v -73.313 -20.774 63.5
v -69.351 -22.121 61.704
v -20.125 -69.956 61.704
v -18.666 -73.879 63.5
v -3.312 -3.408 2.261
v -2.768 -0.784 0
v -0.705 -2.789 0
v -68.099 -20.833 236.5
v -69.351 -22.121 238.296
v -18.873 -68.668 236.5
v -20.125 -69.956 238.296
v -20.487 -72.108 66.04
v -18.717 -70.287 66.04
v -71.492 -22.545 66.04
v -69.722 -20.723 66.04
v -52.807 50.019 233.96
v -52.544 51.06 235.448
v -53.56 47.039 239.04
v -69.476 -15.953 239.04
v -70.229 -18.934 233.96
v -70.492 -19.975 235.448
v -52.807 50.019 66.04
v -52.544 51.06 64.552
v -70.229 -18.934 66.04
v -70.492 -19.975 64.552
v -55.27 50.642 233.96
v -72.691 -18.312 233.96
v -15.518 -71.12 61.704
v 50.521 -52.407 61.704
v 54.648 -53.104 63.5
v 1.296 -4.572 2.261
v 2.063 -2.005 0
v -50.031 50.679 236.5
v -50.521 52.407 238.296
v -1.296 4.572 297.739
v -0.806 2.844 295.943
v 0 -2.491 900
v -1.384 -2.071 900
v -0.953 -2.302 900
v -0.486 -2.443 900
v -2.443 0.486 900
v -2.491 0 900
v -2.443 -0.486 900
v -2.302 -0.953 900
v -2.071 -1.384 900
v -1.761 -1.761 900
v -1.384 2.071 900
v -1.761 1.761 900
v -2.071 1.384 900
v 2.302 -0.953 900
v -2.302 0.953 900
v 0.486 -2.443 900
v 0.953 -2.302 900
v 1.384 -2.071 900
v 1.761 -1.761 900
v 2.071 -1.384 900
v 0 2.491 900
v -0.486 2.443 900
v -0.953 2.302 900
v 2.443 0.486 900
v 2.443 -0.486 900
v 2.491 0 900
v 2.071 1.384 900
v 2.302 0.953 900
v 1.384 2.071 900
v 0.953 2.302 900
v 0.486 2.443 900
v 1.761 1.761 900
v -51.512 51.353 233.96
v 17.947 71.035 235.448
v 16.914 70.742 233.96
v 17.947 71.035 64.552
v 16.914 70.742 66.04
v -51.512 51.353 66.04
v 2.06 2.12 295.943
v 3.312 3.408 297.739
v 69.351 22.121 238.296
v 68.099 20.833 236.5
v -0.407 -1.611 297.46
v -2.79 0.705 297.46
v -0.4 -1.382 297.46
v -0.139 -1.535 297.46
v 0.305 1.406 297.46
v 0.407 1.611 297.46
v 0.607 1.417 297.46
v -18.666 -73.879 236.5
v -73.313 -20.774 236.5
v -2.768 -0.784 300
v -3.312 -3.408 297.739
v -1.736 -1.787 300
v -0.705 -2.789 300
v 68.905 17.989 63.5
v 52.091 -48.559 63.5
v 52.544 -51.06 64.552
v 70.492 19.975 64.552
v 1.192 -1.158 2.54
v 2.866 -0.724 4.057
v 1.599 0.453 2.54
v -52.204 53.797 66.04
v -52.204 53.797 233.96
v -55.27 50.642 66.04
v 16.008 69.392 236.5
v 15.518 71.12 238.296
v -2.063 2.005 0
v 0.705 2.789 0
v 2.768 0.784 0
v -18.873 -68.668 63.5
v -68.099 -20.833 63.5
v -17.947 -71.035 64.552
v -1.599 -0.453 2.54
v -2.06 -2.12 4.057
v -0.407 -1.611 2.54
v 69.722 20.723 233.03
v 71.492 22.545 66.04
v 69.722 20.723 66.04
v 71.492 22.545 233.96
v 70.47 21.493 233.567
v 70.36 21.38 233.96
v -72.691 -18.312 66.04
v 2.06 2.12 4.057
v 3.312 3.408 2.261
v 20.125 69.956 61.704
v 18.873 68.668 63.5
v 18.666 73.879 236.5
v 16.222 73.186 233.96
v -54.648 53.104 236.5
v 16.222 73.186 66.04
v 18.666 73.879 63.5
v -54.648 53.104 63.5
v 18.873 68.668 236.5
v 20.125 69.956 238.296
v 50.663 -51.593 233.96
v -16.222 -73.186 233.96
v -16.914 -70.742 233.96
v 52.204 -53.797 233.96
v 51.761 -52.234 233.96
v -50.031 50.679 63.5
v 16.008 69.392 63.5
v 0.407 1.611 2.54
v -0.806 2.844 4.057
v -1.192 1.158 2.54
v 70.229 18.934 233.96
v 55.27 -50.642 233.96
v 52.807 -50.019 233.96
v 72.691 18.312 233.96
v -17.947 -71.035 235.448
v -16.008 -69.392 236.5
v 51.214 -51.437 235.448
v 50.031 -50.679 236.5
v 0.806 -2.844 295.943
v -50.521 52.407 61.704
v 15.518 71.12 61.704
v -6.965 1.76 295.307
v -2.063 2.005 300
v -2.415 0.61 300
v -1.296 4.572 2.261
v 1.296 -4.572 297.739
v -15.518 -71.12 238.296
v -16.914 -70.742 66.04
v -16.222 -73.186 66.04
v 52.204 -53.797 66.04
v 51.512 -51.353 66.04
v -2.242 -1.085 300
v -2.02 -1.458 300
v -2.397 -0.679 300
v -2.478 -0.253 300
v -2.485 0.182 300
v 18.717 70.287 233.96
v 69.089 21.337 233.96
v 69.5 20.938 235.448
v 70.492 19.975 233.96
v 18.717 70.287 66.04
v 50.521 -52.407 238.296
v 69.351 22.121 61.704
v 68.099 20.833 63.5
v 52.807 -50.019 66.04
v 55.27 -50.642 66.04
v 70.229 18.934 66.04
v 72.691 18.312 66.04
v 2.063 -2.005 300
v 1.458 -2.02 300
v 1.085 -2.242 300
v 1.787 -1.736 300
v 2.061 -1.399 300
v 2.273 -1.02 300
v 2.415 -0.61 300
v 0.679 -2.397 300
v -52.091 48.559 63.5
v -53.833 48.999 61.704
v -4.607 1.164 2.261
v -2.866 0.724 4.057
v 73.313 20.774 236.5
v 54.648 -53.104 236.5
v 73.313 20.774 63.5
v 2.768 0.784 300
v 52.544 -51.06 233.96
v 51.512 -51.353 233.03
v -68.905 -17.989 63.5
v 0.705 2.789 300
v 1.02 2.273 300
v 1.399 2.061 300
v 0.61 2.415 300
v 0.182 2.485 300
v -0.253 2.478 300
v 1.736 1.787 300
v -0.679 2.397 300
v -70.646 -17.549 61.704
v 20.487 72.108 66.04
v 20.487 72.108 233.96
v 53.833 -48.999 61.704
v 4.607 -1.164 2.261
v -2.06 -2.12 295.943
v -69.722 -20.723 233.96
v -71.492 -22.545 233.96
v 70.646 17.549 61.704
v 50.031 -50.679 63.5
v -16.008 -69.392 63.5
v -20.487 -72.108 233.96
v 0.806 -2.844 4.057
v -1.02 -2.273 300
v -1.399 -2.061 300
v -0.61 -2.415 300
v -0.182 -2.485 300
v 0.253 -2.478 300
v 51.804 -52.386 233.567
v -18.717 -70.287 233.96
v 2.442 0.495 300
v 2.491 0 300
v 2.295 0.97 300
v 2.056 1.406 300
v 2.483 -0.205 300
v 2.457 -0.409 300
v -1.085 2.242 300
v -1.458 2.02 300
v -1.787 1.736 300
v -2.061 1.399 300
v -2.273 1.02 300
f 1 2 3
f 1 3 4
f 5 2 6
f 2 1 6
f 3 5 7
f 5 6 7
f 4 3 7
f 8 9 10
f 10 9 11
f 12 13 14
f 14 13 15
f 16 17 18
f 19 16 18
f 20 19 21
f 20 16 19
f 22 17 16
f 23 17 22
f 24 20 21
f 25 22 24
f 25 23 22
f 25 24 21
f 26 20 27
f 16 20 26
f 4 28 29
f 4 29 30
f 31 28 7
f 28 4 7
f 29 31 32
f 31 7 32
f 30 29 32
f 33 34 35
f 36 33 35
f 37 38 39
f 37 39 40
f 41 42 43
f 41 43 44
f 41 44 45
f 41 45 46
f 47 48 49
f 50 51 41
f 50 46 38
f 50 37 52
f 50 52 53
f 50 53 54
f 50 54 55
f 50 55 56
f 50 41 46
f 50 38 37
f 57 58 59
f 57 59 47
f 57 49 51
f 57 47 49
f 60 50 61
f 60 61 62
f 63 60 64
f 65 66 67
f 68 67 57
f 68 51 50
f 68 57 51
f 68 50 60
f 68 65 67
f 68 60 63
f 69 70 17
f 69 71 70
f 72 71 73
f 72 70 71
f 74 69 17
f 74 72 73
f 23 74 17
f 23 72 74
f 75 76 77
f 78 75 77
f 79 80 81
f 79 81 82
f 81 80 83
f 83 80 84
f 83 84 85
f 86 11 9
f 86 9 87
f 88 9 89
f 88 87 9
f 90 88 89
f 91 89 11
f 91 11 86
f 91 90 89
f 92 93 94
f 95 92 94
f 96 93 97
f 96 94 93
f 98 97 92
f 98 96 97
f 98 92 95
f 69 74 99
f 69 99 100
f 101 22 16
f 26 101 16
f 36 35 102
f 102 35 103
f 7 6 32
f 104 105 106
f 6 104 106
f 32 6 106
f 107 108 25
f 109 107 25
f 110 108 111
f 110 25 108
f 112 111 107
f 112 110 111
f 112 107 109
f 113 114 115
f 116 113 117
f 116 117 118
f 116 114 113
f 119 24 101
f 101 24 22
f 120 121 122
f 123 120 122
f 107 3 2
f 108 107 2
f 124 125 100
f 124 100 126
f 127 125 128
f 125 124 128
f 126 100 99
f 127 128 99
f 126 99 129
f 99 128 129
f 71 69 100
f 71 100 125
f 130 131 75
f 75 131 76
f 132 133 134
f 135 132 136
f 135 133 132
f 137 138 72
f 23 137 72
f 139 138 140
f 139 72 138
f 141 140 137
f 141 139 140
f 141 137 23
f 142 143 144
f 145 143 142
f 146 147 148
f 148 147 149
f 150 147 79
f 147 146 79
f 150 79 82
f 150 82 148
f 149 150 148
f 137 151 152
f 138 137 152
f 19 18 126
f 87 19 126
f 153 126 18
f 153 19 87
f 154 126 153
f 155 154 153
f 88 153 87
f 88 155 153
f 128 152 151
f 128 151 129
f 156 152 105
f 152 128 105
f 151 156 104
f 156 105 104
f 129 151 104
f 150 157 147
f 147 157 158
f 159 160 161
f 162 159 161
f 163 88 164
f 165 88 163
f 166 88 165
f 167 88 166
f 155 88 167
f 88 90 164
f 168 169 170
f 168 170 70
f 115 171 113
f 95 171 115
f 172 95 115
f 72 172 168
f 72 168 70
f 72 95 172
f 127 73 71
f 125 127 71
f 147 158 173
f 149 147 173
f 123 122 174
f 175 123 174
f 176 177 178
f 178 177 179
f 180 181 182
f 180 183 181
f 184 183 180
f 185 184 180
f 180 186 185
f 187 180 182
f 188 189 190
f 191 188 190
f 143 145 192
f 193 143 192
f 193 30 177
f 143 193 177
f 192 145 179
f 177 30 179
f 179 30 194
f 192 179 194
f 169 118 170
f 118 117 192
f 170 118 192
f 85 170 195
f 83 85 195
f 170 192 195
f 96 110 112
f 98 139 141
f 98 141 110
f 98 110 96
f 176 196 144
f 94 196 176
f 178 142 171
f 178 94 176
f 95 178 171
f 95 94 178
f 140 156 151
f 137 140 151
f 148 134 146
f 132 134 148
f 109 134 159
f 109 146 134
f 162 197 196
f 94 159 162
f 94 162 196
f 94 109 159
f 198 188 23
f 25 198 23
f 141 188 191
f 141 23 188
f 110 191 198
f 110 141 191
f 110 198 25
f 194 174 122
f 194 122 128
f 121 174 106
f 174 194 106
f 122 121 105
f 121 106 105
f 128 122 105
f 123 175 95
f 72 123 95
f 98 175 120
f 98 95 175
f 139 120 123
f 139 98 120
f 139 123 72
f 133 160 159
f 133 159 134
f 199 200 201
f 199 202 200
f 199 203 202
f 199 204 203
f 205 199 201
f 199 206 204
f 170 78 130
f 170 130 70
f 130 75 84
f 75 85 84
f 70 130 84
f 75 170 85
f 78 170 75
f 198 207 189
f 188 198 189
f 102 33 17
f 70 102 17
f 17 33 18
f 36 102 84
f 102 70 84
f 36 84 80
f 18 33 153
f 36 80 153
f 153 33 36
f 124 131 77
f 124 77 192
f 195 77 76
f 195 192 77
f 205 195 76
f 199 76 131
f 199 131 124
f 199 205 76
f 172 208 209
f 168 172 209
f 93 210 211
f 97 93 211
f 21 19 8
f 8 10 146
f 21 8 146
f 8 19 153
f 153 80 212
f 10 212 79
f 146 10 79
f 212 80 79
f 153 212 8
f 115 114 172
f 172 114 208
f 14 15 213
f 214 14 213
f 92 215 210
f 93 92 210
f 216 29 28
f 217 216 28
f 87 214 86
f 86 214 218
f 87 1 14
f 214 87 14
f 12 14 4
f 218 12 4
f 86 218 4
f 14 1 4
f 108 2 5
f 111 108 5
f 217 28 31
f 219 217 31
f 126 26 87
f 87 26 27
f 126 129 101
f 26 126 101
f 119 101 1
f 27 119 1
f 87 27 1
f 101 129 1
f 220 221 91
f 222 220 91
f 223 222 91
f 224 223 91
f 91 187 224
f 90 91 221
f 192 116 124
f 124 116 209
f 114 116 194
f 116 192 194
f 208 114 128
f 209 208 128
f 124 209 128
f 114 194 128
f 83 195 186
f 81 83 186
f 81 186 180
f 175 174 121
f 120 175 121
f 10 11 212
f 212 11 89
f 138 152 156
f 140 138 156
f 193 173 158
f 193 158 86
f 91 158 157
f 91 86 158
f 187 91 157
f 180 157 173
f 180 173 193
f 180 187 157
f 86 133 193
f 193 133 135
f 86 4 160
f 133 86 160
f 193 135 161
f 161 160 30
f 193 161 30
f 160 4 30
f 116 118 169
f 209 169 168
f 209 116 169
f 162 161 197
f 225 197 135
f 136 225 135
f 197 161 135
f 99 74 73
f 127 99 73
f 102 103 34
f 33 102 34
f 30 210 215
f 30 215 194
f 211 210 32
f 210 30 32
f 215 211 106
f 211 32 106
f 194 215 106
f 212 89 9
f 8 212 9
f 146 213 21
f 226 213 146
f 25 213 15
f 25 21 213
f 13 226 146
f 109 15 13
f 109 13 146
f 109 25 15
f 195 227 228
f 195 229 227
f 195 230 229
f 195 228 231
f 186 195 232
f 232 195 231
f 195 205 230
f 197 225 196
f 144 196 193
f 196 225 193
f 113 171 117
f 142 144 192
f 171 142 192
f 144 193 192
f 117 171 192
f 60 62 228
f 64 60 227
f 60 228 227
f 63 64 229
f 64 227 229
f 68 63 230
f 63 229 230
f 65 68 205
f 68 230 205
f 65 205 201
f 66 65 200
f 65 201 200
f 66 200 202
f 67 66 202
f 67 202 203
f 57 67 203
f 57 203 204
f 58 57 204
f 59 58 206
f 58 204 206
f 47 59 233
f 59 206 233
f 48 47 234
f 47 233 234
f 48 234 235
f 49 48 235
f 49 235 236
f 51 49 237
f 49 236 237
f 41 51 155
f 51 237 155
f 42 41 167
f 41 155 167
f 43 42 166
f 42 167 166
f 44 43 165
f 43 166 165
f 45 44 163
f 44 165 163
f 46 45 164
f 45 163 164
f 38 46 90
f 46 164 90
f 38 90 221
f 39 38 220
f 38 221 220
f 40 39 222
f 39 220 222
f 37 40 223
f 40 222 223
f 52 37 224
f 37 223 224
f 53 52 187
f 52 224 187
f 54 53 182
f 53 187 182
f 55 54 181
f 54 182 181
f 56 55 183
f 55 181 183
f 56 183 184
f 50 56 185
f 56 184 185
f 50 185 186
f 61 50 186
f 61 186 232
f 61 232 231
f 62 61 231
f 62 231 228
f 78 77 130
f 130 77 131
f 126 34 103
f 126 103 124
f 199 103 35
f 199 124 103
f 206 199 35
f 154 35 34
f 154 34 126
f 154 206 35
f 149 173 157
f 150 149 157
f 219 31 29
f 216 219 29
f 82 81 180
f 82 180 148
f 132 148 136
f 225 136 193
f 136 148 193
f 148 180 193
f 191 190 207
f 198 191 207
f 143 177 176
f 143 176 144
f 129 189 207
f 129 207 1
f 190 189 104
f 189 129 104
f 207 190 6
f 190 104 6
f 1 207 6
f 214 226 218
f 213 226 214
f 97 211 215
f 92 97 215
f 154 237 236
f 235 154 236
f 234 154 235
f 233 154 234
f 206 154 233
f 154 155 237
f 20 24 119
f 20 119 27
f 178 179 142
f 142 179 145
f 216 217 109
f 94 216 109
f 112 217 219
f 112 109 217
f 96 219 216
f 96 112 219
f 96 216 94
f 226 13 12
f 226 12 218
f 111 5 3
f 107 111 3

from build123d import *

# Parameters (mm, degrees)
F1_DEPTH  = 300
F2_SIZE   = 63.5
F3_T      = -2.54
F5_DEPTH  = 2.54
F7_DEPTH  = 2.54
F9_DEPTH  = 7.1852048969
F10_DEPTH = 2.541
F12_DEPTH = 2.54
F14_DEPTH = 2.54
F15_W     = 71.12
F15_H     = 167.92
F16_DEPTH = 157.0594794416
F17_W     = 71.12
F17_H     = 167.92
F18_DEPTH = 155.1690173594
F19_W     = 71.12
F19_H     = 167.92
F20_DEPTH = 170.067634702
F22_DEPTH = 2.54
F24_DEPTH = 2.54
F26_DEPTH = 2.54
F28_DEPTH = 2.54
F30_DEPTH = 2.54
F32_DEPTH = 2.54
F33_R     = 2.4911357684
F34_DEPTH = 600


# Not quite as in the source:
# - a feature names something its author has since deleted; it is built from what else it names


with BuildPart() as f1:
    # F0 (on Top) → F1 (new body)
    with BuildSketch(Plane.XY):
        Polygon((73.3134762531, 20.774364002), (18.6656111534, 73.8785148759), (-54.6478650997, 53.104150874), (-73.3134762531, -20.774364002), (-18.6656111534, -73.8785148759), (54.6478650997, -53.104150874), align=None)
    extrude(amount=F1_DEPTH)

    # F2
    f2_edges = [f1.edges().sort_by_distance(p)[0] for p in [
        (45.989544, 47.326439, 300),
        (-17.991127, 63.491333, 300),
        (-63.980671, 16.164893, 300),
        (-45.989544, -47.326439, 300),
        (17.991127, -63.491333, 300),
        (63.980671, -16.164893, 300),
        (45.989544, 47.326439, 0),
        (-17.991127, 63.491333, 0),
        (-63.980671, 16.164893, 0),
        (-45.989544, -47.326439, 0),
        (17.991127, -63.491333, 0),
        (63.980671, -16.164893, 0),
    ]]
    chamfer(f2_edges, length=F2_SIZE)

    # F3
    f3_openings = [f1.faces().sort_by_distance(p)[0] for p in [
        (-42.712352, 10.791394, 258.436633),
    ]]
    offset(amount=F3_T, openings=f3_openings)

    # F4 (on face) → F5 (cut, through all)
    with BuildSketch(Plane(origin=(-105.4037723876, -108.4678135258, 151.2455678842), x_dir=(0.8701504485, -0.287188723, 0.4004507889), z_dir=(-0.4927861574, -0.5071112335, 0.7071067812))):
        Polygon((41.4332766293, 120.899493065), (98.0044622716, 82.0276124879), (117.3270058287, 170.7488222605), align=None)
    extrude(amount=-F5_DEPTH, mode=Mode.SUBTRACT)

    # F6 (on face) → F7 (cut, through all)
    with BuildSketch(Plane(origin=(41.2339958125, -145.5162513053, 151.2455678842), x_dir=(0.9812423716, 0.1336581106, -0.1389205444), z_dir=(0.192778132, -0.6803209476, 0.7071067812))):
        Polygon((-57.8368894269, 113.966214542), (9.4644872932, 127.4512742811), (-40.7019588227, 203.1357603871), align=None)
    extrude(amount=-F7_DEPTH, mode=Mode.SUBTRACT)

    # F8 (on face) → F9 (cut, through all)
    with BuildSketch(Plane(origin=(146.6377682001, -37.0484377795, 151.2455678842), x_dir=(0.7280120913, 0.1631104703, -0.6658778937), z_dir=(0.6855642894, -0.1732097142, 0.7071067812))):
        Polygon((-197.6206426806, 72.1381474707), (-198.5885090871, 69.4293510884), (-126.3576583393, 4.6891971376), (-100.7185084182, 76.4462455114), align=None)
        Polygon((-127.4775404122, 9.1038742336), (-195.0937835337, 69.7079782132), (-104.3824295702, 73.7408450768), align=None, mode=Mode.SUBTRACT)
    extrude(amount=-F9_DEPTH, mode=Mode.SUBTRACT)

    # F8 (on face) + F2_face2 (on face) → F10 (cut, through all)
    with BuildSketch(Plane(origin=(146.6377682001, -37.0484377795, 151.2455678842), x_dir=(0.7280120913, 0.1631104703, -0.6658778937), z_dir=(0.6855642894, -0.1732097142, 0.7071067812))):
        Polygon((-197.6206426806, 72.1381474707), (-198.5885090871, 69.4293510884), (-126.3576583393, 4.6891971376), (-100.7185084182, 76.4462455114), align=None)
        Polygon((-127.4775404122, 9.1038742336), (-195.0937835337, 69.7079782132), (-104.3824295702, 73.7408450768), align=None, mode=Mode.SUBTRACT)
    with BuildSketch(Plane(origin=(42.71235225, -10.7913939511, 258.436632955), x_dir=(0.2449555269, 0.969534316, 0), z_dir=(0.6855642894, -0.1732097142, 0.7071067812))):
        Polygon((0, 55.5822670322), (-34.3195357799, -28.4830838377), (34.3195357799, -28.4830838377), align=None)
    extrude(amount=-F10_DEPTH, mode=Mode.SUBTRACT)

    # F11 (on face) → F12 (cut, through all)
    with BuildSketch(Plane(origin=(105.4037723876, 108.4678135258, 151.2455678842), x_dir=(0.8701504485, -0.287188723, -0.4004507889), z_dir=(0.4927861574, 0.5071112335, 0.7071067812))):
        Polygon((-98.0044622716, -82.0276124879), (-117.3270058287, -170.7488222605), (-41.4332766293, -120.899493065), align=None)
    extrude(amount=-F12_DEPTH, mode=Mode.SUBTRACT)

    # F13 (on face) → F14 (cut, through all)
    with BuildSketch(Plane(origin=(-41.2339958125, 145.5162513053, 151.2455678842), x_dir=(0.9812423716, 0.1336581106, 0.1389205444), z_dir=(-0.192778132, 0.6803209476, 0.7071067812))):
        Polygon((57.8368894269, -113.966214542), (-9.4644872932, -127.4512742811), (40.7019588227, -203.1357603871), align=None)
    extrude(amount=-F14_DEPTH, mode=Mode.SUBTRACT)

    # F15 (on face) → F16 (cut, through all)
    with BuildSketch(Plane(origin=(17.9911269732, -63.4913328749, 0), x_dir=(0.9621191109, 0.2726294488, 0), z_dir=(0.2726294488, -0.9621191109, 0))):
        with Locations((0, 150)):
            Rectangle(F15_W, F15_H)
    extrude(amount=-F16_DEPTH, mode=Mode.SUBTRACT)

    # F17 (on face) → F18 (cut, through all)
    with BuildSketch(Plane(origin=(63.9806706764, -16.164893436, 0), x_dir=(0.2449555269, 0.969534316, 0), z_dir=(0.969534316, -0.2449555269, 0))):
        with Locations((0, 150)):
            Rectangle(F17_W, F17_H)
    extrude(amount=-F18_DEPTH, mode=Mode.SUBTRACT)

    # F19 (on face) → F20 (cut, through all)
    with BuildSketch(Plane(origin=(45.9895437032, 47.3264394389, 0), x_dir=(-0.717163584, 0.6969048671, 0), z_dir=(0.6969048671, 0.717163584, 0))):
        with Locations((0, 150)):
            Rectangle(F19_W, F19_H)
    extrude(amount=-F20_DEPTH, mode=Mode.SUBTRACT)

    # F21 (on face) → F22 (cut, through all)
    with BuildSketch(Plane(origin=(1.2076208066, -0.3051087374, -1.2455678842), x_dir=(0.7280120913, 0.1631104703, 0.6658778937), z_dir=(0.6855642894, -0.1732097142, -0.7071067812))):
        Polygon((95.3809385521, -2.3644010884), (72.2858277101, 62.2725697547), (4.6695845886, 1.6684657751), align=None)
    extrude(amount=-F22_DEPTH, mode=Mode.SUBTRACT)

    # F23 (on face) → F24 (cut, through all)
    with BuildSketch(Plane(origin=(0.8680423208, 0.8932759279, -1.2455678842), x_dir=(0.8701504485, -0.287188723, 0.4004507889), z_dir=(0.4927861574, 0.5071112335, -0.7071067812))):
        Polygon((22.13077439, -92.8080958564), (78.7019600324, -53.9362152793), (2.808230833, -4.0868860838), align=None)
    extrude(amount=-F24_DEPTH, mode=Mode.SUBTRACT)

    # F25 (on face) → F26 (cut, through all)
    with BuildSketch(Plane(origin=(-0.3395784858, 1.1983846653, -1.2455678842), x_dir=(0.9812423716, 0.1336581106, -0.1389205444), z_dir=(-0.192778132, 0.6803209476, -0.7071067812))):
        Polygon((16.1607261154, -94.0316157631), (-0.9742044888, -4.862069918), (-51.1406506047, -80.546556024), align=None)
    extrude(amount=-F26_DEPTH, mode=Mode.SUBTRACT)

    # F27 (on face) → F28 (cut, through all)
    with BuildSketch(Plane(origin=(-1.2076208066, 0.3051087374, -1.2455678842), x_dir=(0.7280120913, 0.1631104703, -0.6658778937), z_dir=(-0.6855642894, 0.1732097142, -0.7071067812))):
        Polygon((-72.2858277101, -62.2725697547), (-4.6695845886, -1.6684657751), (-95.3809385521, 2.3644010884), align=None)
    extrude(amount=-F28_DEPTH, mode=Mode.SUBTRACT)

    # F29 (on face) → F30 (cut, through all)
    with BuildSketch(Plane(origin=(-0.8680423208, -0.8932759279, -1.2455678842), x_dir=(0.8701504485, -0.287188723, -0.4004507889), z_dir=(-0.4927861574, -0.5071112335, -0.7071067812))):
        Polygon((-78.7019600324, 53.9362152793), (-2.808230833, 4.0868860838), (-22.13077439, 92.8080958564), align=None)
    extrude(amount=-F30_DEPTH, mode=Mode.SUBTRACT)

    # F31 (on face) → F32 (cut, through all)
    with BuildSketch(Plane(origin=(0.3395784858, -1.1983846653, -1.2455678842), x_dir=(0.9812423716, 0.1336581106, 0.1389205444), z_dir=(0.192778132, -0.6803209476, -0.7071067812))):
        Polygon((-16.1607261154, 94.0316157631), (0.9742044888, 4.862069918), (51.1406506047, 80.546556024), align=None)
    extrude(amount=-F32_DEPTH, mode=Mode.SUBTRACT)

    # F33 (on face) → F34 (join)
    with BuildSketch(Plane.XY.offset(300)):
        Circle(F33_R)
    extrude(amount=F34_DEPTH)


solid = f1.part
